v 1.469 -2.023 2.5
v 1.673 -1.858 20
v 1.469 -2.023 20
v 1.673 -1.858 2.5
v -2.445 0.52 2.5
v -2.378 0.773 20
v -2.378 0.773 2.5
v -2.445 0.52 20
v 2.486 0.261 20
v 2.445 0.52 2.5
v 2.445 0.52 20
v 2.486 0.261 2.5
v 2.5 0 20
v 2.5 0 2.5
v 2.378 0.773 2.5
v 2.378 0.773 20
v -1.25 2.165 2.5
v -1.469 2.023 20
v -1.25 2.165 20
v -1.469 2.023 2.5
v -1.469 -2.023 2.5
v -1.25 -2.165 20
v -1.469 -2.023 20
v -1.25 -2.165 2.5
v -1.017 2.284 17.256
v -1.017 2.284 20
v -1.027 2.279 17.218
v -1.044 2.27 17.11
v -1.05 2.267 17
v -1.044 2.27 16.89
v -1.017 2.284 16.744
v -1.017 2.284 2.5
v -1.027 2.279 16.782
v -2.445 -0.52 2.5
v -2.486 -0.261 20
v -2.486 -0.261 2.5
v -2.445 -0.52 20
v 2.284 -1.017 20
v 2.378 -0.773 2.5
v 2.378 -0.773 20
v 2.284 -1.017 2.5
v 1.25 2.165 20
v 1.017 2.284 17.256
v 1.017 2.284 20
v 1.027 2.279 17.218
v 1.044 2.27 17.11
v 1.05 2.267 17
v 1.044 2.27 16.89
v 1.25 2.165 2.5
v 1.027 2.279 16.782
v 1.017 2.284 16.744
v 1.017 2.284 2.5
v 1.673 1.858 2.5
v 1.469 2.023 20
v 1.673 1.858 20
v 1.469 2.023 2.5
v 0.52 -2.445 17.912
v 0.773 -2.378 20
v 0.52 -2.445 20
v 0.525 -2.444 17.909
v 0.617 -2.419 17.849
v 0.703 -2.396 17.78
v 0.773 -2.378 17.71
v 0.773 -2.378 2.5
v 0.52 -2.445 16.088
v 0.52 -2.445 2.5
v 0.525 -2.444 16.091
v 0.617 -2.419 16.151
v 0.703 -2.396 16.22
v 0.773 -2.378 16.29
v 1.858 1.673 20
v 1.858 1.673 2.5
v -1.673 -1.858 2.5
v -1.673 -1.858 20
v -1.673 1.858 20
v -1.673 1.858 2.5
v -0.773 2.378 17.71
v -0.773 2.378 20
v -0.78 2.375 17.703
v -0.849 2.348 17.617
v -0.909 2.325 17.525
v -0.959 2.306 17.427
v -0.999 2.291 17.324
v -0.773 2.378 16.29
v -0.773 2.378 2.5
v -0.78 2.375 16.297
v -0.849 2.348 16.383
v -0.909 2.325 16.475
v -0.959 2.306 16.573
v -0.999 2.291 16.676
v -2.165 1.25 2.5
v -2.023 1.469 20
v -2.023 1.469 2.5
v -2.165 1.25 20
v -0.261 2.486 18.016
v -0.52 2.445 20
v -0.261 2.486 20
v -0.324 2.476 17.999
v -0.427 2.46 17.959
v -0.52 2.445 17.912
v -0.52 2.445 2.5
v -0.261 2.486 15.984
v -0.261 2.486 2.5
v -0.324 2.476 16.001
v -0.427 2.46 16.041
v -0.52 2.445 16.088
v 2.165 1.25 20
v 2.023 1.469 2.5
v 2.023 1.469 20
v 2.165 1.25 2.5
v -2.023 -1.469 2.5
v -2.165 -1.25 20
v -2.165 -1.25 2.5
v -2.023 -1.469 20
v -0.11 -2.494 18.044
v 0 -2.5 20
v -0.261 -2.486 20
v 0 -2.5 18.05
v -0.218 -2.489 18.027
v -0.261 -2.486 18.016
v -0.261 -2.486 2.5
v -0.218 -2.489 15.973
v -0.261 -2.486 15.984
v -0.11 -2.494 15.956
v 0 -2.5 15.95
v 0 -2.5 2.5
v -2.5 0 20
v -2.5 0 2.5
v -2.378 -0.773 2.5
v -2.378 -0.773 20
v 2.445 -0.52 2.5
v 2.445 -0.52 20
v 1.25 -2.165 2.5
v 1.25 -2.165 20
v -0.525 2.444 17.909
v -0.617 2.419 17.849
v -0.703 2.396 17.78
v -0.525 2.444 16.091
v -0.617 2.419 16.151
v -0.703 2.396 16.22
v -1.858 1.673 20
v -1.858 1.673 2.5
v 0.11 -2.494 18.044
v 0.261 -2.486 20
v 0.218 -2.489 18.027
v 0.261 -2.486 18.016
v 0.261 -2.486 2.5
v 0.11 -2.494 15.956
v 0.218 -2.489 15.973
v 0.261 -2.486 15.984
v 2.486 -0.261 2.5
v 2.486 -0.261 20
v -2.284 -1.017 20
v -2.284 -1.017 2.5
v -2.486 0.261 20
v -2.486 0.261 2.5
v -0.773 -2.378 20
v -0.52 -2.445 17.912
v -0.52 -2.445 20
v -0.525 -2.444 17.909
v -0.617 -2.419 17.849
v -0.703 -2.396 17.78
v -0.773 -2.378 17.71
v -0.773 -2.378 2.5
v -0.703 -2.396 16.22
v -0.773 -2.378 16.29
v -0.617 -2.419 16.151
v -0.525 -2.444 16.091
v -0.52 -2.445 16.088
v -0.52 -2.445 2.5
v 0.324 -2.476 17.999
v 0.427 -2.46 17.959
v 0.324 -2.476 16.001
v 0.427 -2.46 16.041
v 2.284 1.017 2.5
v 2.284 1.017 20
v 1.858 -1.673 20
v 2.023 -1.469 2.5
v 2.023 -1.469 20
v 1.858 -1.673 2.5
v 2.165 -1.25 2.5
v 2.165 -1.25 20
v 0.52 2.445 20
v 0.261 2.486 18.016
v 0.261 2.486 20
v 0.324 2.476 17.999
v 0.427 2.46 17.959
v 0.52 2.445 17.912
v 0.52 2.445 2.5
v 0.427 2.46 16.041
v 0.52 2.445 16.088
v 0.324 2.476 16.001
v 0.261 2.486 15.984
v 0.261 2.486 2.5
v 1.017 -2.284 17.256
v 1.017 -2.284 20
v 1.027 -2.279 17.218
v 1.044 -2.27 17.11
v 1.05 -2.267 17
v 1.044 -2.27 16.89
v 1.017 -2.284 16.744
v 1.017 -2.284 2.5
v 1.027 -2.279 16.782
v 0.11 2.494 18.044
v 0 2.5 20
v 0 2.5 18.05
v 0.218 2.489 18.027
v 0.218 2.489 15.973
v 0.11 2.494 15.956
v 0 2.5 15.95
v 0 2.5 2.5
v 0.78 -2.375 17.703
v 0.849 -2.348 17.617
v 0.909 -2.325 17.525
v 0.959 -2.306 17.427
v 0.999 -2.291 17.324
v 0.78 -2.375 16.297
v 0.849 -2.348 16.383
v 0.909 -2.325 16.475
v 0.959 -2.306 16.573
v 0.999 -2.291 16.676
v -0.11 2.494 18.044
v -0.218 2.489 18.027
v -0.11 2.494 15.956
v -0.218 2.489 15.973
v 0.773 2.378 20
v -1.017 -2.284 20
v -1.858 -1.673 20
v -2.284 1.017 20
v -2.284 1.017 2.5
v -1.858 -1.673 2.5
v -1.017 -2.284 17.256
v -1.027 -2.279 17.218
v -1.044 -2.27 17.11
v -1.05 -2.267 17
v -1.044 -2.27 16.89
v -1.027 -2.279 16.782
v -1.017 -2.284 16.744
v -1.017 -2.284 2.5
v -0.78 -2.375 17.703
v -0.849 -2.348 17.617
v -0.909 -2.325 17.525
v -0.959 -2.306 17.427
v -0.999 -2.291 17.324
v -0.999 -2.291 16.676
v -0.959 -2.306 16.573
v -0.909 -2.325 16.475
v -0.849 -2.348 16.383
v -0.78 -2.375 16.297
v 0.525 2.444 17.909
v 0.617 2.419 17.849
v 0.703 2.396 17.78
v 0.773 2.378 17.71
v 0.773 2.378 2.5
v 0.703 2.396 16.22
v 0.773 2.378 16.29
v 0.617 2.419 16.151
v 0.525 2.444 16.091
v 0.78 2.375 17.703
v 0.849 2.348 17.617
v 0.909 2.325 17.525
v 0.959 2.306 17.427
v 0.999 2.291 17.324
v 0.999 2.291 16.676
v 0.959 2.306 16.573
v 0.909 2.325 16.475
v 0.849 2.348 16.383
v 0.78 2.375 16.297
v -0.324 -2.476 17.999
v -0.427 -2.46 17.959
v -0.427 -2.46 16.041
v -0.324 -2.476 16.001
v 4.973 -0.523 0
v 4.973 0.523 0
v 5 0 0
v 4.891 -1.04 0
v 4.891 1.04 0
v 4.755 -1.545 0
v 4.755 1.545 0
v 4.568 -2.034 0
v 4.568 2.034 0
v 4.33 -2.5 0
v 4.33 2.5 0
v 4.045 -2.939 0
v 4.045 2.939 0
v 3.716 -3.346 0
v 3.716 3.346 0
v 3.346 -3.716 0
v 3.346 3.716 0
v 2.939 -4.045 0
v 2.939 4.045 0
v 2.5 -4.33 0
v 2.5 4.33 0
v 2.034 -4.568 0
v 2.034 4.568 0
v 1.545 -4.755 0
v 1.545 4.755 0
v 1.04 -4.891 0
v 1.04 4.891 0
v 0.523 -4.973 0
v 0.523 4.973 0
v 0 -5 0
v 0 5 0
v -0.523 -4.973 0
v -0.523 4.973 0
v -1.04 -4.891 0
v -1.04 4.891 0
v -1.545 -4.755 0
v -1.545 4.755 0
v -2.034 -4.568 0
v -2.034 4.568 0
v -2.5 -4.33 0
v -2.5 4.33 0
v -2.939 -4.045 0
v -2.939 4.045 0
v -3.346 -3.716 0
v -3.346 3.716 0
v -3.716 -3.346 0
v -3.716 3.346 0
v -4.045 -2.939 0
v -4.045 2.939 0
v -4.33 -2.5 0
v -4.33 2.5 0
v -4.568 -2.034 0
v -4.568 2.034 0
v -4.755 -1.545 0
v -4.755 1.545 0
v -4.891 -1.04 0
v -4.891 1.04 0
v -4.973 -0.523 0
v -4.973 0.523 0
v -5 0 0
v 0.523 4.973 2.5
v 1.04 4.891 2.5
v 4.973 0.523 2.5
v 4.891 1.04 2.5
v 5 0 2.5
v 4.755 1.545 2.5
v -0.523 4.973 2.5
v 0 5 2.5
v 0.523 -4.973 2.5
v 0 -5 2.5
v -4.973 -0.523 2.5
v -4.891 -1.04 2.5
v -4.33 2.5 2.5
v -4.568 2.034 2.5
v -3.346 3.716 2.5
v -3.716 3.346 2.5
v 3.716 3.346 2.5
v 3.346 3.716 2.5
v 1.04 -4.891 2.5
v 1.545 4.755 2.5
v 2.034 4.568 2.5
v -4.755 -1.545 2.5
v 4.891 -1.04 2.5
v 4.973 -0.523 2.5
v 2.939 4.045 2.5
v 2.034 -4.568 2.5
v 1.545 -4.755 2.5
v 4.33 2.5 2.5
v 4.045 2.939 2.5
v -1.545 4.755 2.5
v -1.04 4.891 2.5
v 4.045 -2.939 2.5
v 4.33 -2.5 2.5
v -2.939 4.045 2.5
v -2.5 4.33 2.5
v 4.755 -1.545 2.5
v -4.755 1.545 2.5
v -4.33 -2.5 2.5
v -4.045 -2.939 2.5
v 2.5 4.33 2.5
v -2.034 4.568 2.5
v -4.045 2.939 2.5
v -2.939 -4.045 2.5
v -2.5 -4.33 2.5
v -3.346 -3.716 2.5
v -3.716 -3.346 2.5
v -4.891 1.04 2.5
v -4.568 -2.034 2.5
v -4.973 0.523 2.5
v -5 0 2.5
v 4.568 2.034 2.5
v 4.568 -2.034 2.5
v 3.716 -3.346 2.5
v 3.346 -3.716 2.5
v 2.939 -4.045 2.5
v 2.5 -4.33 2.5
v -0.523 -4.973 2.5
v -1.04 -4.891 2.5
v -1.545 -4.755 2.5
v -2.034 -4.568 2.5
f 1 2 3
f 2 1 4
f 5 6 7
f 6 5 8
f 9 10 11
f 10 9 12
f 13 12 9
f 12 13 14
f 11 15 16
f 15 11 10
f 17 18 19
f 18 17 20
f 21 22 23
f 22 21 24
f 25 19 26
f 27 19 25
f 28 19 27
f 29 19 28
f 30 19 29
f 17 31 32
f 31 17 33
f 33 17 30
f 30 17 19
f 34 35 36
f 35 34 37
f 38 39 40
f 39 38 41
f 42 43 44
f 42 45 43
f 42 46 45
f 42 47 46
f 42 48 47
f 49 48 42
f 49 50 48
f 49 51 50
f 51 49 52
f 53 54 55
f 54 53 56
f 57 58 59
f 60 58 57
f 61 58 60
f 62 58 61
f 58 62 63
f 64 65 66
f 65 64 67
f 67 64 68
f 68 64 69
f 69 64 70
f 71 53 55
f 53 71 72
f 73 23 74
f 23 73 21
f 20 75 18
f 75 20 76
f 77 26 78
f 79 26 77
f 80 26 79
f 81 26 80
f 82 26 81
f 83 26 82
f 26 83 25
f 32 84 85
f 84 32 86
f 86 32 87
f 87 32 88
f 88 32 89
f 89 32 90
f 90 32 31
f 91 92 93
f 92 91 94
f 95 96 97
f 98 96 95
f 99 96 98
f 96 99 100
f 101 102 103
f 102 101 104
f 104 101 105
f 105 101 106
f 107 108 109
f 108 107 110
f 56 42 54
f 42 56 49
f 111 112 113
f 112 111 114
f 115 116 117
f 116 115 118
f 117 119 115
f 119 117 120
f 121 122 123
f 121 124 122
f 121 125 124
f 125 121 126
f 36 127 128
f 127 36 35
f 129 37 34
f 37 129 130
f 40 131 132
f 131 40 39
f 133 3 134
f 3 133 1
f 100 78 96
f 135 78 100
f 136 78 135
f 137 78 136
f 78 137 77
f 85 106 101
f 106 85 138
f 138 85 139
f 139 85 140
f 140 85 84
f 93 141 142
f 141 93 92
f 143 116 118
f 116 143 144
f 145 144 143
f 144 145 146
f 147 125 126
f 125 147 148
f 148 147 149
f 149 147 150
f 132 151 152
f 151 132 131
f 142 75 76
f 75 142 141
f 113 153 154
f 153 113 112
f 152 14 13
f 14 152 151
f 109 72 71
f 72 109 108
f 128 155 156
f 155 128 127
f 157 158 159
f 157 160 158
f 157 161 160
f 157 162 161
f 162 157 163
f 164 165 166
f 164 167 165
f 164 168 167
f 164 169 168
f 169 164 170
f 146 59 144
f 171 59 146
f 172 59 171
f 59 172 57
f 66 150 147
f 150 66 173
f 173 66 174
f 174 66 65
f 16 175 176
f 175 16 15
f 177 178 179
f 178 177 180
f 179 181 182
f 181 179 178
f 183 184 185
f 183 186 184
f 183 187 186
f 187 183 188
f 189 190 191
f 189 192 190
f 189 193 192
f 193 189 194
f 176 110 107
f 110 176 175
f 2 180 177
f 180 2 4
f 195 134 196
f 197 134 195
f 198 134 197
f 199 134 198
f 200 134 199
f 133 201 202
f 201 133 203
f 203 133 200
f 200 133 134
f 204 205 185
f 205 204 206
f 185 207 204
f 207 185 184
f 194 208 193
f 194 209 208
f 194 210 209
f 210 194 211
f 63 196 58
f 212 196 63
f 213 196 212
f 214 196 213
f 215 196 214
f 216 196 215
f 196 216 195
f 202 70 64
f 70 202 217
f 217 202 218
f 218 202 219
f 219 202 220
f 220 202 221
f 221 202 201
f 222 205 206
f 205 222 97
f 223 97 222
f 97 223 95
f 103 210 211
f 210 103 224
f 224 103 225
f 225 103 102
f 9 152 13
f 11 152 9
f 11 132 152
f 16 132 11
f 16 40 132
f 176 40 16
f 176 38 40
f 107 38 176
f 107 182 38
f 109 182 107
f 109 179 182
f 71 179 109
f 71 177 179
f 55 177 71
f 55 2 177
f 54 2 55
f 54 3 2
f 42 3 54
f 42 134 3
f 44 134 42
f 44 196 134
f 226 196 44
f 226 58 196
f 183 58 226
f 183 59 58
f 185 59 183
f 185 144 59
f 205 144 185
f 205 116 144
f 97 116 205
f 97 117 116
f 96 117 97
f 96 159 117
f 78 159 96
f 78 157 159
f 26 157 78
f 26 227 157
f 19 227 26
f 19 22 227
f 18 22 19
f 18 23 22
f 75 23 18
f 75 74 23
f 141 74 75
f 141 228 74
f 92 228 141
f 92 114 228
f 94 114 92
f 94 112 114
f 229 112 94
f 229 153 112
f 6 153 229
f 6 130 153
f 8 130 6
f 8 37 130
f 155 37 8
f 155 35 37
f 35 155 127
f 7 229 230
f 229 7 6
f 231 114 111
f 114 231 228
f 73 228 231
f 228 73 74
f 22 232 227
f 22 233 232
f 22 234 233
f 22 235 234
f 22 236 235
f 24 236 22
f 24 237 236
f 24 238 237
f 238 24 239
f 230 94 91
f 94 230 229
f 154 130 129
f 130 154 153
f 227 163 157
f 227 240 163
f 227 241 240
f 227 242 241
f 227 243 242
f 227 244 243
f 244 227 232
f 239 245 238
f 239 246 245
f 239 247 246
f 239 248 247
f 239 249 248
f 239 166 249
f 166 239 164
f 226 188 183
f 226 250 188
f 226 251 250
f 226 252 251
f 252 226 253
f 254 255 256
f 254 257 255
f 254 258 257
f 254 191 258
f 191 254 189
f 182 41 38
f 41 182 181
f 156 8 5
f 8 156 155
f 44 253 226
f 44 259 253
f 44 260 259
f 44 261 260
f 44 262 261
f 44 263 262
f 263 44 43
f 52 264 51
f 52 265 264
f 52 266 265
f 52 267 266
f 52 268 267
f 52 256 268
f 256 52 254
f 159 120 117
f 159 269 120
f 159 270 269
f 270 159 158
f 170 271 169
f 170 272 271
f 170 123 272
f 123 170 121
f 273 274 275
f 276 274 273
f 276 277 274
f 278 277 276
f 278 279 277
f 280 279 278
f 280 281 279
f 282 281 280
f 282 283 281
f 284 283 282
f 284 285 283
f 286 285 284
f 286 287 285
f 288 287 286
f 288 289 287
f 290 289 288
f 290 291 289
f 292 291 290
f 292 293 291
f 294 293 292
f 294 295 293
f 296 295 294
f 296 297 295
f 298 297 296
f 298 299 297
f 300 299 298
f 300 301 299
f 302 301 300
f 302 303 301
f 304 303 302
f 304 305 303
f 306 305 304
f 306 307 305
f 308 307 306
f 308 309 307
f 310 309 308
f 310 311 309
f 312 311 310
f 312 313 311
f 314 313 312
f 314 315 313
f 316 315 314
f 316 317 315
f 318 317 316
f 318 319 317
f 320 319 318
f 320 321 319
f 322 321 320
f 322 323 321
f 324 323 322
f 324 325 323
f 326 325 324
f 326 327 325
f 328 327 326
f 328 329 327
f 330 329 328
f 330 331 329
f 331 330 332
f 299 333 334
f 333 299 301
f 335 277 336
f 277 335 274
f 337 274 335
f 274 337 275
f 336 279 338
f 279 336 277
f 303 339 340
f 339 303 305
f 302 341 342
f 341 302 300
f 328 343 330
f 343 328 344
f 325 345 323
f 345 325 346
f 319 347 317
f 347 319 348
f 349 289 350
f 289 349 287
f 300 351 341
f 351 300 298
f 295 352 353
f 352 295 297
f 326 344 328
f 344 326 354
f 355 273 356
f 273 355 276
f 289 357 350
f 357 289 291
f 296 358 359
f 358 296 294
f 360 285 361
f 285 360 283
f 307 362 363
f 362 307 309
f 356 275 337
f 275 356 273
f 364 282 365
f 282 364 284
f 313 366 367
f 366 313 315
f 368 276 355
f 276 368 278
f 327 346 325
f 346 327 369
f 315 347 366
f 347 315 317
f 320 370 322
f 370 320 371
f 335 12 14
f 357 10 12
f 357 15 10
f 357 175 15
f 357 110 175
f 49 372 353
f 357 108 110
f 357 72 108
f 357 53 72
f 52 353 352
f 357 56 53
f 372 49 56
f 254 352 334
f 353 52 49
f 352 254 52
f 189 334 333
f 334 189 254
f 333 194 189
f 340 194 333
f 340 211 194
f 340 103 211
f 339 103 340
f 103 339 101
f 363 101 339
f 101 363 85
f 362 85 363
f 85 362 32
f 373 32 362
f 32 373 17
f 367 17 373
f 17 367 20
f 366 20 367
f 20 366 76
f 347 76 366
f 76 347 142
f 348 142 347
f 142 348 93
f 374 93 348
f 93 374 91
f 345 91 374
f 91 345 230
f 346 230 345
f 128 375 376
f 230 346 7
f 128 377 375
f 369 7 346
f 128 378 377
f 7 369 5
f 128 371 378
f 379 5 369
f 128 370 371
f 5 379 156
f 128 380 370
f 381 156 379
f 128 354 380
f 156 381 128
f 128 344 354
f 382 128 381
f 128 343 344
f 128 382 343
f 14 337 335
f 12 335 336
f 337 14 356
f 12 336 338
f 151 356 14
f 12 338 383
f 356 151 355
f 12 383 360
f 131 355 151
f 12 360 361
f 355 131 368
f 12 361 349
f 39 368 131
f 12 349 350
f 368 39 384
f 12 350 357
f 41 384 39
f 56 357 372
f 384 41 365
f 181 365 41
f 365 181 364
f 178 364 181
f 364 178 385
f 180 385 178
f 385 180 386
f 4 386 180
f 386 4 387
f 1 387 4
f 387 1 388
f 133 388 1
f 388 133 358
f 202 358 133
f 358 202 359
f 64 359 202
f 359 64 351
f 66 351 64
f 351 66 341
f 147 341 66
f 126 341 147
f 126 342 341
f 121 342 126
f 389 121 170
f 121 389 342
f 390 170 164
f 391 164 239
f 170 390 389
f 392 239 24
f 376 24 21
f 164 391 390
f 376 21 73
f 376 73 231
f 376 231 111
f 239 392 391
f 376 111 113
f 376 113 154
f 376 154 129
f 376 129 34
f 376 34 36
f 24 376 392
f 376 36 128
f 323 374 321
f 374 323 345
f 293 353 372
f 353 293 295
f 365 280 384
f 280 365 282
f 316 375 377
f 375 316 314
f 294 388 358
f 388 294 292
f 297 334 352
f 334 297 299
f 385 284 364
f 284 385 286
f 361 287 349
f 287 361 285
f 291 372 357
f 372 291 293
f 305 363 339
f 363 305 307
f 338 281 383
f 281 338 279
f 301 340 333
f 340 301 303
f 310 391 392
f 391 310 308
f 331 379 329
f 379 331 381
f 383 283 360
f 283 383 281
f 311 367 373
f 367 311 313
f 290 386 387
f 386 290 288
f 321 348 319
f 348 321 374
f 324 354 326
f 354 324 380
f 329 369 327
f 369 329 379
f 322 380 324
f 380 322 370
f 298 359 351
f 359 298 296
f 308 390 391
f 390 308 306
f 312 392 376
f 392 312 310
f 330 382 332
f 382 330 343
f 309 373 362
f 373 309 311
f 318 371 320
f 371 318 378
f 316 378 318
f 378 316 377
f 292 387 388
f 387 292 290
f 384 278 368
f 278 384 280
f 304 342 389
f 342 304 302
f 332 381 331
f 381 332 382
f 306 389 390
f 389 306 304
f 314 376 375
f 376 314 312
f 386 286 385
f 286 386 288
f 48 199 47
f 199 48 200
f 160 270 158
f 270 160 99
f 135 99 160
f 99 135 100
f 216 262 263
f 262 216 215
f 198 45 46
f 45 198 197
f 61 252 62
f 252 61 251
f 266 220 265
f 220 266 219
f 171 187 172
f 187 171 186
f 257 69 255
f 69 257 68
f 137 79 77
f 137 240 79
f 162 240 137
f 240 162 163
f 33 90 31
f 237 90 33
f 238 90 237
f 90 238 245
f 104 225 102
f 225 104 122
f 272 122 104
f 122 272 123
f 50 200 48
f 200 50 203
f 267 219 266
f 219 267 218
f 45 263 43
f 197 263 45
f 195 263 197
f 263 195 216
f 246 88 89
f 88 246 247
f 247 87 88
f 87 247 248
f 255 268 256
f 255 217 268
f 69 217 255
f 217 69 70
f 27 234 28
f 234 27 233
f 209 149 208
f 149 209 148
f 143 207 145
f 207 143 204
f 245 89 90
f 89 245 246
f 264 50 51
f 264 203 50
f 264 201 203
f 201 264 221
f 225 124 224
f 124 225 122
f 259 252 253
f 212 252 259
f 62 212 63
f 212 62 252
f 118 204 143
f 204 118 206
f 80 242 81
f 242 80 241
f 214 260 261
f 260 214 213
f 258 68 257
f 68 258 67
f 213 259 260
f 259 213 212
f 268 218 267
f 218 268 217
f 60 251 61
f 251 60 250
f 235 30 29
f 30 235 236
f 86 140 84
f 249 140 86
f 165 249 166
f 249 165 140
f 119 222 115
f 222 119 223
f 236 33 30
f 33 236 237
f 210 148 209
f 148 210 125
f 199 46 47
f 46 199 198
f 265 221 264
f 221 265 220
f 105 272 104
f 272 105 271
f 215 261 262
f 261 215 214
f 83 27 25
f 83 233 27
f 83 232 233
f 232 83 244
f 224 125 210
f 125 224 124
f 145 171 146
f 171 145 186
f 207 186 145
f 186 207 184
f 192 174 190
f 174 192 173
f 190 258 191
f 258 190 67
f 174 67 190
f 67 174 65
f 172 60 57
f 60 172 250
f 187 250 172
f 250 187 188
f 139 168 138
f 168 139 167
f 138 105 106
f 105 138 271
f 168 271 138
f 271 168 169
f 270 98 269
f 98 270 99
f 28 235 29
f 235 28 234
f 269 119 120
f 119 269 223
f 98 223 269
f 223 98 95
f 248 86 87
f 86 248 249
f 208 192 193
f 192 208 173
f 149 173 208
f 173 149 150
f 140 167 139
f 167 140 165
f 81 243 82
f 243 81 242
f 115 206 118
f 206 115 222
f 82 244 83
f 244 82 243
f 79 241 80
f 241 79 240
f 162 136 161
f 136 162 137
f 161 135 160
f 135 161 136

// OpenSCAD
// Clevis pin with cross-hole.
$fn = 60;
eps = 0.02;
pin_d = 5;
pin_l = 20;
head_d = pin_d + 5;
difference() {
    union() { cylinder(d=pin_d,h=pin_l); cylinder(d=head_d,h=2.5); }
    translate([0,-pin_d-eps,pin_l-3]) rotate([-90,0,0]) cylinder(d=pin_d*0.42,h=2*pin_d+2*eps);
}
